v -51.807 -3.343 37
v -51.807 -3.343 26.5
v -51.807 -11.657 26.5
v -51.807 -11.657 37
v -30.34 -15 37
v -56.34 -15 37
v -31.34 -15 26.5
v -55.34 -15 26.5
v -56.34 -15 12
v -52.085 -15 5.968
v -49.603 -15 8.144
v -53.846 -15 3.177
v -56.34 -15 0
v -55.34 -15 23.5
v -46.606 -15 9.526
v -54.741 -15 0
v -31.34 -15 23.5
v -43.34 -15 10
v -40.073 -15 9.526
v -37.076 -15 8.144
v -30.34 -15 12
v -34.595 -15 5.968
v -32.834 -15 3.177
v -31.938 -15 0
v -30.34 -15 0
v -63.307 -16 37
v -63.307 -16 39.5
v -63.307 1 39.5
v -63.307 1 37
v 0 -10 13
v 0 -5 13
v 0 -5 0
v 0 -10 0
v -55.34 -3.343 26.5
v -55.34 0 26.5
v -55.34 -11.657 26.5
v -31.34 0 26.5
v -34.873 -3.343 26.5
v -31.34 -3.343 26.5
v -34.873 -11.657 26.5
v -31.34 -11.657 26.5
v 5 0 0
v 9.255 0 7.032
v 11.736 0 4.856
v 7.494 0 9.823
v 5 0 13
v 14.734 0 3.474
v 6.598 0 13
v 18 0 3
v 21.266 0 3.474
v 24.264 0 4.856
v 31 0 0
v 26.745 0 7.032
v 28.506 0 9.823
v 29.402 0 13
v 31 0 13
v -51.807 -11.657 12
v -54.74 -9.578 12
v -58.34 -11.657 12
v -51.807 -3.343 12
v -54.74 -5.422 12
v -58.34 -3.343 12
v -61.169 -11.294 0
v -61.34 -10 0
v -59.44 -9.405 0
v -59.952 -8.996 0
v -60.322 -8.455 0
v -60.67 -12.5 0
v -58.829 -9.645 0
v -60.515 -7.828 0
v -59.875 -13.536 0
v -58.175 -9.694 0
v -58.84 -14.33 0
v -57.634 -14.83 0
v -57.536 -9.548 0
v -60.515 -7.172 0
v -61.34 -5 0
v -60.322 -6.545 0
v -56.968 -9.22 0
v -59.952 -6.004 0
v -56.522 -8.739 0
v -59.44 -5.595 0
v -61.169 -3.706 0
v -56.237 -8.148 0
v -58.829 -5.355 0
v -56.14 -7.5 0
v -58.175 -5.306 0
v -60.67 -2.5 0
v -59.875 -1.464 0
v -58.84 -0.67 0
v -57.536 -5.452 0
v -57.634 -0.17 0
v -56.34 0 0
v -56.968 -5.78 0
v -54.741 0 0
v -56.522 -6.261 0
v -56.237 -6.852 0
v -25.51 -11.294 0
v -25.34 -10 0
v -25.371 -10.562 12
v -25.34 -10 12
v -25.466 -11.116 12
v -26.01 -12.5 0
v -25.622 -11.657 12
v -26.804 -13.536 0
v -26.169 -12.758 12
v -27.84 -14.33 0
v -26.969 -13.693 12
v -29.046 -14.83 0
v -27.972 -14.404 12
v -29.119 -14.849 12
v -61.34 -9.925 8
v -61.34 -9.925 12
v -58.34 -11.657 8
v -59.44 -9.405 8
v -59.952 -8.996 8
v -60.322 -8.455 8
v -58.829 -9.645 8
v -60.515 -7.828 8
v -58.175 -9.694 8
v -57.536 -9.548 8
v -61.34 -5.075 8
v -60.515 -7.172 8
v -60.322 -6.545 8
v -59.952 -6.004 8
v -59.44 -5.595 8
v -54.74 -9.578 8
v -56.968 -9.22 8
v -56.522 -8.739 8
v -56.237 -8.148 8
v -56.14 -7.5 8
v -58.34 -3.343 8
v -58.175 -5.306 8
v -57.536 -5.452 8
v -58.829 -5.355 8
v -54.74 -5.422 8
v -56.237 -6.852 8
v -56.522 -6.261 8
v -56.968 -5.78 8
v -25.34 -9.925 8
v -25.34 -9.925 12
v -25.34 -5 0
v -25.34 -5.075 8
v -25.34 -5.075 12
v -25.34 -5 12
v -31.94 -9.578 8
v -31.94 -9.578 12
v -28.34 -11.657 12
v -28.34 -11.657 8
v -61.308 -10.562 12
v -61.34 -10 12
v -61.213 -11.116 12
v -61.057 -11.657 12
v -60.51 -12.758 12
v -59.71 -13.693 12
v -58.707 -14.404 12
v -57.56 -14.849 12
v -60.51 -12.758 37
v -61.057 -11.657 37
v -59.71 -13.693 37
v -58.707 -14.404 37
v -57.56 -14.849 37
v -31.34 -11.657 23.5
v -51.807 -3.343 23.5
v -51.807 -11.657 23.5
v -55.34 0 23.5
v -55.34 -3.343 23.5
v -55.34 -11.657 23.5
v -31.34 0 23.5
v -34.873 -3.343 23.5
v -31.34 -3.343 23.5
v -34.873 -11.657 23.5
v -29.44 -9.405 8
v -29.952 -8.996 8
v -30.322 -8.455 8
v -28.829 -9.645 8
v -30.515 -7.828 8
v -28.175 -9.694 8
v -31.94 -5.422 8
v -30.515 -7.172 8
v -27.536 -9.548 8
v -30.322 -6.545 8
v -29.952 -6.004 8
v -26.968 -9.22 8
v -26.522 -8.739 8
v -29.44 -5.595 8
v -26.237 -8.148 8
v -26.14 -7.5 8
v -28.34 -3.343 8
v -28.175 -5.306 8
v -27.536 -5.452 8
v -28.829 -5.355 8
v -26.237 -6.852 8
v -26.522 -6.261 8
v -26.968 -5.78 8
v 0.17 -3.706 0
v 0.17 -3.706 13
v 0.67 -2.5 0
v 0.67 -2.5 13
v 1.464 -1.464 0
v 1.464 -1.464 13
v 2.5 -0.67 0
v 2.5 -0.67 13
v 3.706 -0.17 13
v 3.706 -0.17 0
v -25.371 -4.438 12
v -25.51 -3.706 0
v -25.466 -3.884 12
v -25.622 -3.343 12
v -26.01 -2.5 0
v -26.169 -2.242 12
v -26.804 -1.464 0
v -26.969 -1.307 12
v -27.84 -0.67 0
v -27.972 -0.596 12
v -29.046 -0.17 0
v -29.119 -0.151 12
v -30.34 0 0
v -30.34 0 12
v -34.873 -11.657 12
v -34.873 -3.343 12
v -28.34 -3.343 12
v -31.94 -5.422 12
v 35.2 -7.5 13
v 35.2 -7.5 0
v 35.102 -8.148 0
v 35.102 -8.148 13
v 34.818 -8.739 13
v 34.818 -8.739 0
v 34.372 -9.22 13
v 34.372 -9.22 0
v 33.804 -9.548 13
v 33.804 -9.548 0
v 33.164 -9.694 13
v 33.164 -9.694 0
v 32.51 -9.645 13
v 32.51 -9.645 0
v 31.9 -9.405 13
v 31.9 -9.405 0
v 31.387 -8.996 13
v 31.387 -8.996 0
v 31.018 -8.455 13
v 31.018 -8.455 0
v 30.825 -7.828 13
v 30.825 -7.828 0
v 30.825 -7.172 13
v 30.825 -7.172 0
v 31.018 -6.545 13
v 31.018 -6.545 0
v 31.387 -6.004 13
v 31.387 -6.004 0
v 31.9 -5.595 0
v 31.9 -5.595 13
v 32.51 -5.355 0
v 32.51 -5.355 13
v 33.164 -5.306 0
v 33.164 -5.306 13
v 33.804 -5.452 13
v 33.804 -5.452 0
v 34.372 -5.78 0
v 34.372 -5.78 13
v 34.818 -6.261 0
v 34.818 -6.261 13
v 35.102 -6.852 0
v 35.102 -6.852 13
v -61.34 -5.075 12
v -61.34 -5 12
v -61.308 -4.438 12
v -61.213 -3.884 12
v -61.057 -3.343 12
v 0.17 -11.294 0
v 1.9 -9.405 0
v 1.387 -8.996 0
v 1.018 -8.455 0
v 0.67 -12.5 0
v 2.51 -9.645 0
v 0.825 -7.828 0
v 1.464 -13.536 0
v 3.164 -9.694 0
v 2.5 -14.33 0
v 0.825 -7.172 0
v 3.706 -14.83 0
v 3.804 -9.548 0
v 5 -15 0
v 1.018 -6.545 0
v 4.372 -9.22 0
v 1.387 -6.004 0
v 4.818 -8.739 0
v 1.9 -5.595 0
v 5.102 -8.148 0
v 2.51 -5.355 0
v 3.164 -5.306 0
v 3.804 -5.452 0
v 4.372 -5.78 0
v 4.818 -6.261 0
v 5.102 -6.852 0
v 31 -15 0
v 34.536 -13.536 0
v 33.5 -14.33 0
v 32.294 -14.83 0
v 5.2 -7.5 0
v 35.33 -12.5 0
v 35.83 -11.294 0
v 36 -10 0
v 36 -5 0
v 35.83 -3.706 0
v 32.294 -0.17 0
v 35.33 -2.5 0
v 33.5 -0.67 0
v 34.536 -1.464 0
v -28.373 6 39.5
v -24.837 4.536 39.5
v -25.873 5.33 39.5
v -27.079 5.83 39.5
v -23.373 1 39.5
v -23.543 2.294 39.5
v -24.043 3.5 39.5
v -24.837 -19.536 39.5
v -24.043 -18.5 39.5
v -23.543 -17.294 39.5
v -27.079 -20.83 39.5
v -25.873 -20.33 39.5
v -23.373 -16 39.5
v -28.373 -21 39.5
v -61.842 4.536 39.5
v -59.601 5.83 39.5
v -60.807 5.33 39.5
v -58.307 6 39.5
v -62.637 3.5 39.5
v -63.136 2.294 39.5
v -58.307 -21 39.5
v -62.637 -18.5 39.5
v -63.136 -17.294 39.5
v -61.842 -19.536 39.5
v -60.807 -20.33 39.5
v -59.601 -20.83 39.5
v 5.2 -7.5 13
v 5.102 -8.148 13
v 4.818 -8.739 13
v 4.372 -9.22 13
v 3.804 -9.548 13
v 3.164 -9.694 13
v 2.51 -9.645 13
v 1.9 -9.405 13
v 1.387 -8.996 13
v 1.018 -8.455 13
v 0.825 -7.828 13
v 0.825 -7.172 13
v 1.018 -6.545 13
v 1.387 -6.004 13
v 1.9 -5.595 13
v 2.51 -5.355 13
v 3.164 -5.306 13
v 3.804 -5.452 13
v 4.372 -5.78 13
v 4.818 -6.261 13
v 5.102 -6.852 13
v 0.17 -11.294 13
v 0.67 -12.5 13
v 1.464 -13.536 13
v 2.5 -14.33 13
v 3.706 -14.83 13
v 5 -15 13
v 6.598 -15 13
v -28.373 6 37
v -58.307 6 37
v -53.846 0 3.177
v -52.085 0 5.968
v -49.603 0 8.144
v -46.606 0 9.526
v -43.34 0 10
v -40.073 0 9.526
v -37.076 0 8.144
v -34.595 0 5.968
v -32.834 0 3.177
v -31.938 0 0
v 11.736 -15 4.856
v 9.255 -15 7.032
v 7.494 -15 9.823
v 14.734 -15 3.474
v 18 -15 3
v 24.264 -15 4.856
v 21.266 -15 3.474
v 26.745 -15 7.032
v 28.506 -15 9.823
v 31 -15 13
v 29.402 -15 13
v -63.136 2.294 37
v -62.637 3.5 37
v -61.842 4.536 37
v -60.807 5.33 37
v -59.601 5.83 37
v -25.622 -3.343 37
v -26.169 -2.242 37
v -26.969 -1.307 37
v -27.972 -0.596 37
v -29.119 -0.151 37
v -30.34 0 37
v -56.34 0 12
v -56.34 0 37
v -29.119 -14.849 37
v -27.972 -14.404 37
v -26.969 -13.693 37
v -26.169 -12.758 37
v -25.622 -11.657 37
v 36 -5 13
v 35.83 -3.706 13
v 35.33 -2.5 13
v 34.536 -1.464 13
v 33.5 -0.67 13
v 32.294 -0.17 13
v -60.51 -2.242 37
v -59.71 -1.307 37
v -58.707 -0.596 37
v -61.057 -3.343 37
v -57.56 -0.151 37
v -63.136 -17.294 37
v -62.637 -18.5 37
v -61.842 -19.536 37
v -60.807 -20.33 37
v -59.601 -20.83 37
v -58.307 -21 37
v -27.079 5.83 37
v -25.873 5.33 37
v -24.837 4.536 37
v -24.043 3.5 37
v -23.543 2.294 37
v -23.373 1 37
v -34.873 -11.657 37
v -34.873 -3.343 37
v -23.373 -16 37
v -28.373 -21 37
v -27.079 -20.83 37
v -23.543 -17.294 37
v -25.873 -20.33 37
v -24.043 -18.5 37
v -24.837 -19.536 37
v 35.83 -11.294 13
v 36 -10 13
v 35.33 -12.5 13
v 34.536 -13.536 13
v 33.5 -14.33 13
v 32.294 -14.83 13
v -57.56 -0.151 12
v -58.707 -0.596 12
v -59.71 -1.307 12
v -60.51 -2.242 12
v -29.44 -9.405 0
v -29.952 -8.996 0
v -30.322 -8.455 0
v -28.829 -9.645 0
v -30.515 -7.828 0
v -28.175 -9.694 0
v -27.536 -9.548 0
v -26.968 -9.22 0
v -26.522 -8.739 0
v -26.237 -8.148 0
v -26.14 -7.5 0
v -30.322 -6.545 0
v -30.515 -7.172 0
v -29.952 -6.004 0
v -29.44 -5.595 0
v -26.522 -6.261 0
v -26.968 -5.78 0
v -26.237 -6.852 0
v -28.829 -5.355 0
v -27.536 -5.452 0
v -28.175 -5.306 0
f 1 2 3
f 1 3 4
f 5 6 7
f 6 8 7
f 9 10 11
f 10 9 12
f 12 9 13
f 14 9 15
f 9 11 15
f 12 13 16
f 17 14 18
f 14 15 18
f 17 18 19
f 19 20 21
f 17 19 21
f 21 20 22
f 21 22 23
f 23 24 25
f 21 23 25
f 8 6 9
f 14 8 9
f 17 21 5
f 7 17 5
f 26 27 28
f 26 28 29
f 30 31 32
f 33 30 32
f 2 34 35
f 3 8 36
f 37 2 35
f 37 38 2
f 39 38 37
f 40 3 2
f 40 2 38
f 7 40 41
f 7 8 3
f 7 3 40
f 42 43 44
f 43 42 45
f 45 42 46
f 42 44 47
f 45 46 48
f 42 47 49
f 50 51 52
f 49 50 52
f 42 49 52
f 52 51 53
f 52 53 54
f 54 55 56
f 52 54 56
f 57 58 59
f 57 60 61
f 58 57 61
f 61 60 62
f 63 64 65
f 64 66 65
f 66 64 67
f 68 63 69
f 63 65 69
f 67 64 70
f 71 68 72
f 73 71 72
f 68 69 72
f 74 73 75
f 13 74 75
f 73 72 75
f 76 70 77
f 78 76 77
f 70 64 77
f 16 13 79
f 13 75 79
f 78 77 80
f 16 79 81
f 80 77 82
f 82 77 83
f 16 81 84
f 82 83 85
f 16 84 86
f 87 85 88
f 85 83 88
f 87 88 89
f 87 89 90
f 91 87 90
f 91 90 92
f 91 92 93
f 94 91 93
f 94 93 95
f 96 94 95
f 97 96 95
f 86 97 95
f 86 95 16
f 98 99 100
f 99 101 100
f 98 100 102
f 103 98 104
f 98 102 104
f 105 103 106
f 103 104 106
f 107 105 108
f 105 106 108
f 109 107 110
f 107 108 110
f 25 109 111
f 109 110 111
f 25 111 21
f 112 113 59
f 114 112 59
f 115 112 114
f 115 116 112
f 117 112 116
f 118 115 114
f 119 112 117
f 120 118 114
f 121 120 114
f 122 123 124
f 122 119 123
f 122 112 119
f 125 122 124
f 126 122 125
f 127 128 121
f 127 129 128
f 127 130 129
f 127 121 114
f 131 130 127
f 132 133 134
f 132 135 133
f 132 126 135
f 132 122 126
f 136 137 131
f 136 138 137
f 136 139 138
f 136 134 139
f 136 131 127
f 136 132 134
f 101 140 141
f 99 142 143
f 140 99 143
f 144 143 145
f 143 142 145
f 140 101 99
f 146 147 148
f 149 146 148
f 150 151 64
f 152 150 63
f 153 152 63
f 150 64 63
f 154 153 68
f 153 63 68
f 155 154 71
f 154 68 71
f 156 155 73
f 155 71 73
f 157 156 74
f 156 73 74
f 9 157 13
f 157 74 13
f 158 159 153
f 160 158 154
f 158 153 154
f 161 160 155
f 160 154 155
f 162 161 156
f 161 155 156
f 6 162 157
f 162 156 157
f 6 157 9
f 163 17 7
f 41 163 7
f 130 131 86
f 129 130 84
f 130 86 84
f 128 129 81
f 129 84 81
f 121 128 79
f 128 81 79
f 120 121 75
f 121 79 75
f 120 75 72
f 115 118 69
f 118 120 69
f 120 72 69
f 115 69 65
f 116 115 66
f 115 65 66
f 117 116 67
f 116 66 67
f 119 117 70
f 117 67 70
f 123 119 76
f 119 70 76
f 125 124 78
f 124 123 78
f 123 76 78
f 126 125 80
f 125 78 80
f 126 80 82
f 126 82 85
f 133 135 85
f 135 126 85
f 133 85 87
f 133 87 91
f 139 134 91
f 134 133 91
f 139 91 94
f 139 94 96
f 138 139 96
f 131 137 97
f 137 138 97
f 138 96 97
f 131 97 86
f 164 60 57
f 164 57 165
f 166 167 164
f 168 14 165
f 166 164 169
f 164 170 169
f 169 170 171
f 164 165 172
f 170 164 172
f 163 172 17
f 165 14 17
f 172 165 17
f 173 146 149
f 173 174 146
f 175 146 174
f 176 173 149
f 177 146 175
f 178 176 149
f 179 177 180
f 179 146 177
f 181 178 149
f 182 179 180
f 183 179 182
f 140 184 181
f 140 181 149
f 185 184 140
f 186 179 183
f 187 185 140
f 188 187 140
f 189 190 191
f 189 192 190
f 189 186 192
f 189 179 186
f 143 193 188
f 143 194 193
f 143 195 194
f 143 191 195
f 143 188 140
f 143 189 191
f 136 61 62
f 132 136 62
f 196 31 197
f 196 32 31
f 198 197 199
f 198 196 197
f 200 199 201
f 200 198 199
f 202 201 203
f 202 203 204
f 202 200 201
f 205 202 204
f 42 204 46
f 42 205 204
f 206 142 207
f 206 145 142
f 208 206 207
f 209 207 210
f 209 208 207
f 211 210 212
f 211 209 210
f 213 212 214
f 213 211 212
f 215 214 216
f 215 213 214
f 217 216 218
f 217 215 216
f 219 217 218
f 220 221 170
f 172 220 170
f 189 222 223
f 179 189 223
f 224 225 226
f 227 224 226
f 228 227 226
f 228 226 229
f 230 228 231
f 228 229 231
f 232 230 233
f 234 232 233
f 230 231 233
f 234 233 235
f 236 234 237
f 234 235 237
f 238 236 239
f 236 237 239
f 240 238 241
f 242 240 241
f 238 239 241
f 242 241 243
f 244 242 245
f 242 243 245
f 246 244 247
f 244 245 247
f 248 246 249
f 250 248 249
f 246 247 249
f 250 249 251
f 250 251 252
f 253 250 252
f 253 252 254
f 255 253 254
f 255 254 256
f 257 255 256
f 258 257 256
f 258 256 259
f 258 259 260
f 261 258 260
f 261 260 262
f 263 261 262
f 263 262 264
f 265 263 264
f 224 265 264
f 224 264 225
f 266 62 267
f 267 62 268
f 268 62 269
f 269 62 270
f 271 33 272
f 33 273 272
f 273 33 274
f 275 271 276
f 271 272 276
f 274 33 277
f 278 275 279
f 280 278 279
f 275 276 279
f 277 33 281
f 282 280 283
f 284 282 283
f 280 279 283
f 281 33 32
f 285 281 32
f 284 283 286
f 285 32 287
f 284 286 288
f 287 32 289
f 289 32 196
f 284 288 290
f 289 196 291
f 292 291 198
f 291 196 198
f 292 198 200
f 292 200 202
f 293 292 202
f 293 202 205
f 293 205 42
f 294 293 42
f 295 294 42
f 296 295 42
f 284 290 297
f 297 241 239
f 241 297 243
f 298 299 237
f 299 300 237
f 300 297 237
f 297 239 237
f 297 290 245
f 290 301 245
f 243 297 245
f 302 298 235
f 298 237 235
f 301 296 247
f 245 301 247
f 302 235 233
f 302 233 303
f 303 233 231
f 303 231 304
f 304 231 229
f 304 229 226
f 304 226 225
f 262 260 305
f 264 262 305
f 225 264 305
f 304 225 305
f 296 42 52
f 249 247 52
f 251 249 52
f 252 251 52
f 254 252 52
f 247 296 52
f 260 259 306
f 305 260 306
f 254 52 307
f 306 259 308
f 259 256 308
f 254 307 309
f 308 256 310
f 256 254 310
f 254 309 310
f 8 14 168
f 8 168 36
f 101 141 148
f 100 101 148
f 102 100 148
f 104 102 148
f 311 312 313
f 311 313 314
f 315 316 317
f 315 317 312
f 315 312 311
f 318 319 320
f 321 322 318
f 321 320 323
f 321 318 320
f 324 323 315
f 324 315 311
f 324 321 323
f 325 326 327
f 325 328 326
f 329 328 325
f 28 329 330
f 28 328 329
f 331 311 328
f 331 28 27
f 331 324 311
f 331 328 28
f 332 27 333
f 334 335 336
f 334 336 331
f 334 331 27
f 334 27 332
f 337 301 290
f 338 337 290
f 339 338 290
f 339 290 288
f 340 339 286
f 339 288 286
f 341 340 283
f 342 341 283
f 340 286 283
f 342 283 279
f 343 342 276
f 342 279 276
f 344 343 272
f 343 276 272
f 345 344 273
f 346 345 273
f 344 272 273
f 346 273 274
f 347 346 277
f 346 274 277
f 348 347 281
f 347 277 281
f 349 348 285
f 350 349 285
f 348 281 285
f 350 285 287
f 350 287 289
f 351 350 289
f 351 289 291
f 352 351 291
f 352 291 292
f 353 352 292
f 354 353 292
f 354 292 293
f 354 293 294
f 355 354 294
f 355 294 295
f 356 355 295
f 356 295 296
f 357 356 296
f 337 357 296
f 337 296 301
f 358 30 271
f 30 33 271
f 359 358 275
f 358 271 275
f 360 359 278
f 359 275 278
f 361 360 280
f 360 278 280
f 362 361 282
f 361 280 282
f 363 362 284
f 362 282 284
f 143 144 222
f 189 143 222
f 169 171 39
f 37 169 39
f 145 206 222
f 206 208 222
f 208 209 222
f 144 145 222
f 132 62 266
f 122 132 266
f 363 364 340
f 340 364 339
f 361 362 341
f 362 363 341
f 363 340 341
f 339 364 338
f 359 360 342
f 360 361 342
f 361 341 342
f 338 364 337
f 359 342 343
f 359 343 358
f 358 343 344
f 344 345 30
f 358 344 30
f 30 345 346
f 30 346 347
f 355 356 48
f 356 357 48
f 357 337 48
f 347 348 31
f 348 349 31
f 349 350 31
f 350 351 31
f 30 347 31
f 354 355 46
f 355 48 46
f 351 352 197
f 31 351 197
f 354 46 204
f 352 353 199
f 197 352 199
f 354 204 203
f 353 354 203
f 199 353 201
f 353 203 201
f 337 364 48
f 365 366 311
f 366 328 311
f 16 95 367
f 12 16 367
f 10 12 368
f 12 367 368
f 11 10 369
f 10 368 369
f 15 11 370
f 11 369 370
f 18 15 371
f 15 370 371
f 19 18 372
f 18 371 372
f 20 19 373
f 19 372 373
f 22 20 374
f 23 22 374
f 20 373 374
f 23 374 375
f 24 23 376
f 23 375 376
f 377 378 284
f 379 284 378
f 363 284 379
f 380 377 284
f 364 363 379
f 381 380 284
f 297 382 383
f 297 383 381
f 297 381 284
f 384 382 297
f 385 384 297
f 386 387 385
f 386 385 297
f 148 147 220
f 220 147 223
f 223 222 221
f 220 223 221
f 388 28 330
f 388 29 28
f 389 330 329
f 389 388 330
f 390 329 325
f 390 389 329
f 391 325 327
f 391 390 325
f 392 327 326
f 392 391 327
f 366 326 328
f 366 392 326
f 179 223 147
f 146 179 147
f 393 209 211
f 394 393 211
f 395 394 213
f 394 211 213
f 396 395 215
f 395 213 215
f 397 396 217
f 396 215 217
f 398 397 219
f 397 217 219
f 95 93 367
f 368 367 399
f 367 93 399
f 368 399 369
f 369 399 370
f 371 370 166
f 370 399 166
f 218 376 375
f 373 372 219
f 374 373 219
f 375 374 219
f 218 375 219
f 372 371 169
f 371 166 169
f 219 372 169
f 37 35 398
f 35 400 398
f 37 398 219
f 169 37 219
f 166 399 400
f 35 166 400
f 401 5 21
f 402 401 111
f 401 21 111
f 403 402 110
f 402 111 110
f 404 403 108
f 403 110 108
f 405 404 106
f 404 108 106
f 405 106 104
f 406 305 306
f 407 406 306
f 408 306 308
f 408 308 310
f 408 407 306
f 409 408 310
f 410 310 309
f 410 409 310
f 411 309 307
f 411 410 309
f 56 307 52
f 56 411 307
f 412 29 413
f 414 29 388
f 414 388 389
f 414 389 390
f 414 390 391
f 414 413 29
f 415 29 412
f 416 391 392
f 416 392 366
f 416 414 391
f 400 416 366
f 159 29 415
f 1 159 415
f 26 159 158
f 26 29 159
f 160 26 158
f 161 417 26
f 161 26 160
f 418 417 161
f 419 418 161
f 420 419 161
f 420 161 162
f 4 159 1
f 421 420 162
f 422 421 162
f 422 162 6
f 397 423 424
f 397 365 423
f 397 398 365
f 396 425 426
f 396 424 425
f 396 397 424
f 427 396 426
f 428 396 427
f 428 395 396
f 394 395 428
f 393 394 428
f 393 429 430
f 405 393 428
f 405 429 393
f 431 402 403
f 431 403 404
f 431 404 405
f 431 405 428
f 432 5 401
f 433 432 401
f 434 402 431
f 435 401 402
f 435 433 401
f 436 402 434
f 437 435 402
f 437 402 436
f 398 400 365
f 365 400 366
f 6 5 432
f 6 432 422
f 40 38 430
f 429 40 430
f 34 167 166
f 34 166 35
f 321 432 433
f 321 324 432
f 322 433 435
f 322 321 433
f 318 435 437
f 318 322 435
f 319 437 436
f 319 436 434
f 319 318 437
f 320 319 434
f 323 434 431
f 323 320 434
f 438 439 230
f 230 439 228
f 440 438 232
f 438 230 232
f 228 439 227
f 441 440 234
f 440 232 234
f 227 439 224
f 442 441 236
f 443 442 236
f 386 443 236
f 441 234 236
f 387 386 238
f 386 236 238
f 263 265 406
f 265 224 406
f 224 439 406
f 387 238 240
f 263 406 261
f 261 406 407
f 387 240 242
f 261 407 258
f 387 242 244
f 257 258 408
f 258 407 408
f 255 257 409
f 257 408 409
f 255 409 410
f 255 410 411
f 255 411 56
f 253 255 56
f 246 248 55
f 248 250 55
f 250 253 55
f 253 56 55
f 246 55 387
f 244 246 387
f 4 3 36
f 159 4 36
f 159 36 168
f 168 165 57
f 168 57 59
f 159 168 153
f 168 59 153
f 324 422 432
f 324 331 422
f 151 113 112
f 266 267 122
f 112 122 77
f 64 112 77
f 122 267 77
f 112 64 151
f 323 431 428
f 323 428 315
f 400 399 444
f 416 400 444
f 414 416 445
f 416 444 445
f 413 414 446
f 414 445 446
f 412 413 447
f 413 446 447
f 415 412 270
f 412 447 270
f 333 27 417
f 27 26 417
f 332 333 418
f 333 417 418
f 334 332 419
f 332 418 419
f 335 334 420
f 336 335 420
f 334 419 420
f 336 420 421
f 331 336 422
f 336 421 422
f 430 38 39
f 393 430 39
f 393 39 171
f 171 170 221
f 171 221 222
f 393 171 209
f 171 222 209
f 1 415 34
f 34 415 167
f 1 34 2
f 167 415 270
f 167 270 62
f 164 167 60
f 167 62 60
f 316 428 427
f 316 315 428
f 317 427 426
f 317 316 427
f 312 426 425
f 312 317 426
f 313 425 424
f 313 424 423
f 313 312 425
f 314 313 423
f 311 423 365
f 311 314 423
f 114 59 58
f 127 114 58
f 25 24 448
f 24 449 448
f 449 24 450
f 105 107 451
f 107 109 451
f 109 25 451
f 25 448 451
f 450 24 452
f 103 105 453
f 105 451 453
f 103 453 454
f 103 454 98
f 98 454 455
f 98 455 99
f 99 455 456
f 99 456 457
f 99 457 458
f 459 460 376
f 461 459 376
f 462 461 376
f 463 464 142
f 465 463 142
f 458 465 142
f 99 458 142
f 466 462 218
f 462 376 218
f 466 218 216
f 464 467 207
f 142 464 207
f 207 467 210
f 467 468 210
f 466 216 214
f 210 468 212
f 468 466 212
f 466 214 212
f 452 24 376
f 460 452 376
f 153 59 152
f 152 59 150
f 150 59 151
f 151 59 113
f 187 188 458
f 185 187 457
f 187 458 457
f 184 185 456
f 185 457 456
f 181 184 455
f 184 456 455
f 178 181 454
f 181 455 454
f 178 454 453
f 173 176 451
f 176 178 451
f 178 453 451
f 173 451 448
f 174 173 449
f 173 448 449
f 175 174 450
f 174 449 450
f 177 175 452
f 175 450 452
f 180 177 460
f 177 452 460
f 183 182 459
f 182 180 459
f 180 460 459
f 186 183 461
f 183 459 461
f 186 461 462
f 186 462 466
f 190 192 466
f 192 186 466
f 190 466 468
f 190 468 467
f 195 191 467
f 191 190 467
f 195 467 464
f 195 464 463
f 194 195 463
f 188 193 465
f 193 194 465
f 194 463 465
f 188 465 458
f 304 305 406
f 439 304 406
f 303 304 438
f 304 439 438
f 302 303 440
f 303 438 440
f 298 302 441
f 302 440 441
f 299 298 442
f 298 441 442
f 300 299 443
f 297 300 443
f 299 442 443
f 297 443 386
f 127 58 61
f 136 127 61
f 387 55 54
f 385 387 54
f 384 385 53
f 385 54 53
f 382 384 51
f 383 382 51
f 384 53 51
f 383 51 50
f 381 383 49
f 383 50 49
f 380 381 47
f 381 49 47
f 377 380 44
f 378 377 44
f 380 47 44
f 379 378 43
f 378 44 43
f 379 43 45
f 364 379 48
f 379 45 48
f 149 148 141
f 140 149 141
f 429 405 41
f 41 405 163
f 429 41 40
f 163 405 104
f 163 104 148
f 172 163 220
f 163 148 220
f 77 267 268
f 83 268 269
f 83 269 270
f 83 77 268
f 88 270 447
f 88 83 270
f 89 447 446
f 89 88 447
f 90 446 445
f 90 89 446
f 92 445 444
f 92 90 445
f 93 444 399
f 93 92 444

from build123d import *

# Parameters (mm, degrees)
F1_DEPTH  = 15
F2_R      = 5
F3_R      = 2.2
F4_DEPTH  = 25
F5_W      = 16.9340001484
F5_H      = 25
F6_DEPTH  = 15
F7_DEPTH  = 21
F8_DEPTH  = 6
F9_R      = 5
F10_R     = 2.2
F11_R     = 2.2
F12_DEPTH = 25
F13_R     = 2.2
F14_DEPTH = 4
F15_R     = 2.2
F16_DEPTH = 4
F17_DEPTH = 25
F18_R     = 5
F19_W     = 24
F19_H     = 3
F20_DEPTH = 25


with BuildPart() as f1:
    # F0 (on Front) → F1 (new body)
    with BuildSketch(Plane.XZ):
        with BuildLine():
            Line((0, 13), (0, 0))
            Line((0, 0), (36, 0))
            Line((36, 0), (36, 13))
            Line((36, 13), (29.401754251, 13))
            ThreePointArc((29.401754251, 13), (18, 3), (6.598245749, 13))
            Line((6.598245749, 13), (0, 13))
        make_face()
    extrude(amount=F1_DEPTH)

    # F2
    f2_edges = [f1.edges().sort_by_distance(p)[0] for p in [
        (0, -15, 6.5),
        (36, -15, 6.5),
        (36, 0, 6.5),
        (0, 0, 6.5),
    ]]
    fillet(f2_edges, radius=F2_R)

    # F3 (on face) → F4 (cut)
    with BuildSketch(Plane(origin=(0, 0, 0), x_dir=(1, 0, 0), z_dir=(0, 0, -1))):
        with Locations((3, 7.5)):
            Circle(F3_R)
        with Locations((33, 7.5)):
            Circle(F3_R)
    extrude(amount=-F4_DEPTH, mode=Mode.SUBTRACT)


with BuildPart() as f6:
    # F5 (on Front) → F6 (new body)
    with BuildSketch(Plane.XZ):
        with BuildLine():
            Line((-61.3396323552, 12), (-61.3396323552, 0))
            Line((-61.3396323552, 0), (-54.7413866062, 0))
            ThreePointArc((-54.7413866062, 0), (-43.3396323552, 10), (-31.9378781042, 0))
            Line((-31.9378781042, 0), (-25.3396323552, 0))
            Line((-25.3396323552, 0), (-25.3396323552, 12))
            Line((-25.3396323552, 12), (-34.872632281, 12))
            Line((-34.872632281, 12), (-51.8066324294, 12))
            Line((-51.8066324294, 12), (-61.3396323552, 12))
        make_face()
        with Locations((-43.3396323552, 24.5)):
            Rectangle(F5_W, F5_H)
    extrude(amount=F6_DEPTH)

    # F5 (on Front) → F7 (join)
    with BuildSketch(Plane.XZ):
        Polygon((-63.3066324294, 37), (-51.8066324294, 37), (-34.872632281, 37), (-23.372632281, 37), (-23.372632281, 39.5), (-63.3066324294, 39.5), align=None)
    extrude(amount=F7_DEPTH)

    # F5 (on Front) → F8 (join)
    with BuildSketch(Plane.XZ):
        Polygon((-63.3066324294, 37), (-51.8066324294, 37), (-34.872632281, 37), (-23.372632281, 37), (-23.372632281, 39.5), (-63.3066324294, 39.5), align=None)
    extrude(amount=-F8_DEPTH)

    # F9
    f9_edges = [f6.edges().sort_by_distance(p)[0] for p in [
        (-25.339632, -15, 6),
        (-25.339632, 0, 6),
        (-61.339632, -15, 6),
        (-61.339632, 0, 6),
    ]]
    fillet(f9_edges, radius=F9_R)

    # F10 (on face) + F11 (on face) → F12 (cut)
    with BuildSketch(Plane(origin=(0, 0, 0), x_dir=(1, 0, 0), z_dir=(0, 0, -1))):
        with Locations((-58.3396323552, 7.5)):
            Circle(F10_R)
    with BuildSketch(Plane(origin=(0, 0, 0), x_dir=(1, 0, 0), z_dir=(0, 0, -1))):
        with Locations((-28.3396323552, 7.5)):
            Circle(F11_R)
    extrude(amount=-F12_DEPTH, mode=Mode.SUBTRACT)

    # F13 (on face) → F14 (cut)
    with BuildSketch(Plane.XY.offset(12)):
        Polygon((-61.3396323552, -5.0751288694), (-61.3396323552, -9.9248711306), (-58.3396323552, -11.6569219382), (-54.7396323552, -9.5784609691), (-54.7396323552, -5.4215390309), (-58.3396323552, -3.3430780618), align=None)
        with Locations((-58.3396323552, -7.5)):
            Circle(F13_R, mode=Mode.SUBTRACT)
    extrude(amount=-F14_DEPTH, mode=Mode.SUBTRACT)

    # F15 (on face) → F16 (cut)
    with BuildSketch(Plane.XY.offset(12)):
        Polygon((-25.3396323552, -9.9248711306), (-25.3396323552, -5.0751288694), (-28.3396323552, -3.3430780618), (-31.9396323552, -5.4215390309), (-31.9396323552, -9.5784609691), (-28.3396323552, -11.6569219382), align=None)
        with Locations((-28.3396323552, -7.5)):
            Circle(F15_R, mode=Mode.SUBTRACT)
    extrude(amount=-F16_DEPTH, mode=Mode.SUBTRACT)

    # F13 (on face) + F15 (on face) → F17 (join, through all)
    with BuildSketch(Plane.XY.offset(12)):
        with BuildLine():
            Line((-51.8066324294, -11.6569219382), (-58.3396323552, -11.6569219382))
            Line((-58.3396323552, -11.6569219382), (-61.0571115222, -11.6569219382))
            ThreePointArc((-61.0571115222, -11.6569219382), (-59.2306002129, -14.079498112), (-56.3396323552, -15))
            Line((-56.3396323552, -15), (-51.8066324294, -15))
            Line((-51.8066324294, -15), (-51.8066324294, -11.6569219382))
        make_face()
        with BuildLine():
            Line((-61.0571115222, -3.3430780618), (-58.3396323552, -3.3430780618))
            Line((-58.3396323552, -3.3430780618), (-51.8066324294, -3.3430780618))
            Line((-51.8066324294, -3.3430780618), (-51.8066324294, 0))
            Line((-51.8066324294, 0), (-56.3396323552, 0))
            ThreePointArc((-56.3396323552, 0), (-59.2306002129, -0.920501888), (-61.0571115222, -3.3430780618))
        make_face()
    with BuildSketch(Plane.XY.offset(12)):
        with BuildLine():
            Line((-25.6221531882, -11.6569219382), (-28.3396323552, -11.6569219382))
            Line((-28.3396323552, -11.6569219382), (-34.872632281, -11.6569219382))
            Line((-34.872632281, -11.6569219382), (-34.872632281, -15))
            Line((-34.872632281, -15), (-30.3396323552, -15))
            ThreePointArc((-30.3396323552, -15), (-27.4486644974, -14.079498112), (-25.6221531882, -11.6569219382))
        make_face()
        with BuildLine():
            Line((-34.872632281, -3.3430780618), (-28.3396323552, -3.3430780618))
            Line((-28.3396323552, -3.3430780618), (-25.6221531882, -3.3430780618))
            ThreePointArc((-25.6221531882, -3.3430780618), (-27.4486644974, -0.920501888), (-30.3396323552, 0))
            Line((-30.3396323552, 0), (-34.872632281, 0))
            Line((-34.872632281, 0), (-34.872632281, -3.3430780618))
        make_face()
    extrude(amount=F17_DEPTH)

    # F18
    f18_edges = [f6.edges().sort_by_distance(p)[0] for p in [
        (-23.372632, -21, 38.25),
        (-23.372632, 6, 38.25),
        (-63.306632, 6, 38.25),
        (-63.306632, -21, 38.25),
    ]]
    fillet(f18_edges, radius=F18_R)

    # F19 (on face) → F20 (cut)
    with BuildSketch(Plane.XZ.offset(15)):
        with Locations((-43.3396323552, 25)):
            Rectangle(F19_W, F19_H)
    extrude(amount=-F20_DEPTH, mode=Mode.SUBTRACT)


solid = Compound([f1.part, f6.part])
